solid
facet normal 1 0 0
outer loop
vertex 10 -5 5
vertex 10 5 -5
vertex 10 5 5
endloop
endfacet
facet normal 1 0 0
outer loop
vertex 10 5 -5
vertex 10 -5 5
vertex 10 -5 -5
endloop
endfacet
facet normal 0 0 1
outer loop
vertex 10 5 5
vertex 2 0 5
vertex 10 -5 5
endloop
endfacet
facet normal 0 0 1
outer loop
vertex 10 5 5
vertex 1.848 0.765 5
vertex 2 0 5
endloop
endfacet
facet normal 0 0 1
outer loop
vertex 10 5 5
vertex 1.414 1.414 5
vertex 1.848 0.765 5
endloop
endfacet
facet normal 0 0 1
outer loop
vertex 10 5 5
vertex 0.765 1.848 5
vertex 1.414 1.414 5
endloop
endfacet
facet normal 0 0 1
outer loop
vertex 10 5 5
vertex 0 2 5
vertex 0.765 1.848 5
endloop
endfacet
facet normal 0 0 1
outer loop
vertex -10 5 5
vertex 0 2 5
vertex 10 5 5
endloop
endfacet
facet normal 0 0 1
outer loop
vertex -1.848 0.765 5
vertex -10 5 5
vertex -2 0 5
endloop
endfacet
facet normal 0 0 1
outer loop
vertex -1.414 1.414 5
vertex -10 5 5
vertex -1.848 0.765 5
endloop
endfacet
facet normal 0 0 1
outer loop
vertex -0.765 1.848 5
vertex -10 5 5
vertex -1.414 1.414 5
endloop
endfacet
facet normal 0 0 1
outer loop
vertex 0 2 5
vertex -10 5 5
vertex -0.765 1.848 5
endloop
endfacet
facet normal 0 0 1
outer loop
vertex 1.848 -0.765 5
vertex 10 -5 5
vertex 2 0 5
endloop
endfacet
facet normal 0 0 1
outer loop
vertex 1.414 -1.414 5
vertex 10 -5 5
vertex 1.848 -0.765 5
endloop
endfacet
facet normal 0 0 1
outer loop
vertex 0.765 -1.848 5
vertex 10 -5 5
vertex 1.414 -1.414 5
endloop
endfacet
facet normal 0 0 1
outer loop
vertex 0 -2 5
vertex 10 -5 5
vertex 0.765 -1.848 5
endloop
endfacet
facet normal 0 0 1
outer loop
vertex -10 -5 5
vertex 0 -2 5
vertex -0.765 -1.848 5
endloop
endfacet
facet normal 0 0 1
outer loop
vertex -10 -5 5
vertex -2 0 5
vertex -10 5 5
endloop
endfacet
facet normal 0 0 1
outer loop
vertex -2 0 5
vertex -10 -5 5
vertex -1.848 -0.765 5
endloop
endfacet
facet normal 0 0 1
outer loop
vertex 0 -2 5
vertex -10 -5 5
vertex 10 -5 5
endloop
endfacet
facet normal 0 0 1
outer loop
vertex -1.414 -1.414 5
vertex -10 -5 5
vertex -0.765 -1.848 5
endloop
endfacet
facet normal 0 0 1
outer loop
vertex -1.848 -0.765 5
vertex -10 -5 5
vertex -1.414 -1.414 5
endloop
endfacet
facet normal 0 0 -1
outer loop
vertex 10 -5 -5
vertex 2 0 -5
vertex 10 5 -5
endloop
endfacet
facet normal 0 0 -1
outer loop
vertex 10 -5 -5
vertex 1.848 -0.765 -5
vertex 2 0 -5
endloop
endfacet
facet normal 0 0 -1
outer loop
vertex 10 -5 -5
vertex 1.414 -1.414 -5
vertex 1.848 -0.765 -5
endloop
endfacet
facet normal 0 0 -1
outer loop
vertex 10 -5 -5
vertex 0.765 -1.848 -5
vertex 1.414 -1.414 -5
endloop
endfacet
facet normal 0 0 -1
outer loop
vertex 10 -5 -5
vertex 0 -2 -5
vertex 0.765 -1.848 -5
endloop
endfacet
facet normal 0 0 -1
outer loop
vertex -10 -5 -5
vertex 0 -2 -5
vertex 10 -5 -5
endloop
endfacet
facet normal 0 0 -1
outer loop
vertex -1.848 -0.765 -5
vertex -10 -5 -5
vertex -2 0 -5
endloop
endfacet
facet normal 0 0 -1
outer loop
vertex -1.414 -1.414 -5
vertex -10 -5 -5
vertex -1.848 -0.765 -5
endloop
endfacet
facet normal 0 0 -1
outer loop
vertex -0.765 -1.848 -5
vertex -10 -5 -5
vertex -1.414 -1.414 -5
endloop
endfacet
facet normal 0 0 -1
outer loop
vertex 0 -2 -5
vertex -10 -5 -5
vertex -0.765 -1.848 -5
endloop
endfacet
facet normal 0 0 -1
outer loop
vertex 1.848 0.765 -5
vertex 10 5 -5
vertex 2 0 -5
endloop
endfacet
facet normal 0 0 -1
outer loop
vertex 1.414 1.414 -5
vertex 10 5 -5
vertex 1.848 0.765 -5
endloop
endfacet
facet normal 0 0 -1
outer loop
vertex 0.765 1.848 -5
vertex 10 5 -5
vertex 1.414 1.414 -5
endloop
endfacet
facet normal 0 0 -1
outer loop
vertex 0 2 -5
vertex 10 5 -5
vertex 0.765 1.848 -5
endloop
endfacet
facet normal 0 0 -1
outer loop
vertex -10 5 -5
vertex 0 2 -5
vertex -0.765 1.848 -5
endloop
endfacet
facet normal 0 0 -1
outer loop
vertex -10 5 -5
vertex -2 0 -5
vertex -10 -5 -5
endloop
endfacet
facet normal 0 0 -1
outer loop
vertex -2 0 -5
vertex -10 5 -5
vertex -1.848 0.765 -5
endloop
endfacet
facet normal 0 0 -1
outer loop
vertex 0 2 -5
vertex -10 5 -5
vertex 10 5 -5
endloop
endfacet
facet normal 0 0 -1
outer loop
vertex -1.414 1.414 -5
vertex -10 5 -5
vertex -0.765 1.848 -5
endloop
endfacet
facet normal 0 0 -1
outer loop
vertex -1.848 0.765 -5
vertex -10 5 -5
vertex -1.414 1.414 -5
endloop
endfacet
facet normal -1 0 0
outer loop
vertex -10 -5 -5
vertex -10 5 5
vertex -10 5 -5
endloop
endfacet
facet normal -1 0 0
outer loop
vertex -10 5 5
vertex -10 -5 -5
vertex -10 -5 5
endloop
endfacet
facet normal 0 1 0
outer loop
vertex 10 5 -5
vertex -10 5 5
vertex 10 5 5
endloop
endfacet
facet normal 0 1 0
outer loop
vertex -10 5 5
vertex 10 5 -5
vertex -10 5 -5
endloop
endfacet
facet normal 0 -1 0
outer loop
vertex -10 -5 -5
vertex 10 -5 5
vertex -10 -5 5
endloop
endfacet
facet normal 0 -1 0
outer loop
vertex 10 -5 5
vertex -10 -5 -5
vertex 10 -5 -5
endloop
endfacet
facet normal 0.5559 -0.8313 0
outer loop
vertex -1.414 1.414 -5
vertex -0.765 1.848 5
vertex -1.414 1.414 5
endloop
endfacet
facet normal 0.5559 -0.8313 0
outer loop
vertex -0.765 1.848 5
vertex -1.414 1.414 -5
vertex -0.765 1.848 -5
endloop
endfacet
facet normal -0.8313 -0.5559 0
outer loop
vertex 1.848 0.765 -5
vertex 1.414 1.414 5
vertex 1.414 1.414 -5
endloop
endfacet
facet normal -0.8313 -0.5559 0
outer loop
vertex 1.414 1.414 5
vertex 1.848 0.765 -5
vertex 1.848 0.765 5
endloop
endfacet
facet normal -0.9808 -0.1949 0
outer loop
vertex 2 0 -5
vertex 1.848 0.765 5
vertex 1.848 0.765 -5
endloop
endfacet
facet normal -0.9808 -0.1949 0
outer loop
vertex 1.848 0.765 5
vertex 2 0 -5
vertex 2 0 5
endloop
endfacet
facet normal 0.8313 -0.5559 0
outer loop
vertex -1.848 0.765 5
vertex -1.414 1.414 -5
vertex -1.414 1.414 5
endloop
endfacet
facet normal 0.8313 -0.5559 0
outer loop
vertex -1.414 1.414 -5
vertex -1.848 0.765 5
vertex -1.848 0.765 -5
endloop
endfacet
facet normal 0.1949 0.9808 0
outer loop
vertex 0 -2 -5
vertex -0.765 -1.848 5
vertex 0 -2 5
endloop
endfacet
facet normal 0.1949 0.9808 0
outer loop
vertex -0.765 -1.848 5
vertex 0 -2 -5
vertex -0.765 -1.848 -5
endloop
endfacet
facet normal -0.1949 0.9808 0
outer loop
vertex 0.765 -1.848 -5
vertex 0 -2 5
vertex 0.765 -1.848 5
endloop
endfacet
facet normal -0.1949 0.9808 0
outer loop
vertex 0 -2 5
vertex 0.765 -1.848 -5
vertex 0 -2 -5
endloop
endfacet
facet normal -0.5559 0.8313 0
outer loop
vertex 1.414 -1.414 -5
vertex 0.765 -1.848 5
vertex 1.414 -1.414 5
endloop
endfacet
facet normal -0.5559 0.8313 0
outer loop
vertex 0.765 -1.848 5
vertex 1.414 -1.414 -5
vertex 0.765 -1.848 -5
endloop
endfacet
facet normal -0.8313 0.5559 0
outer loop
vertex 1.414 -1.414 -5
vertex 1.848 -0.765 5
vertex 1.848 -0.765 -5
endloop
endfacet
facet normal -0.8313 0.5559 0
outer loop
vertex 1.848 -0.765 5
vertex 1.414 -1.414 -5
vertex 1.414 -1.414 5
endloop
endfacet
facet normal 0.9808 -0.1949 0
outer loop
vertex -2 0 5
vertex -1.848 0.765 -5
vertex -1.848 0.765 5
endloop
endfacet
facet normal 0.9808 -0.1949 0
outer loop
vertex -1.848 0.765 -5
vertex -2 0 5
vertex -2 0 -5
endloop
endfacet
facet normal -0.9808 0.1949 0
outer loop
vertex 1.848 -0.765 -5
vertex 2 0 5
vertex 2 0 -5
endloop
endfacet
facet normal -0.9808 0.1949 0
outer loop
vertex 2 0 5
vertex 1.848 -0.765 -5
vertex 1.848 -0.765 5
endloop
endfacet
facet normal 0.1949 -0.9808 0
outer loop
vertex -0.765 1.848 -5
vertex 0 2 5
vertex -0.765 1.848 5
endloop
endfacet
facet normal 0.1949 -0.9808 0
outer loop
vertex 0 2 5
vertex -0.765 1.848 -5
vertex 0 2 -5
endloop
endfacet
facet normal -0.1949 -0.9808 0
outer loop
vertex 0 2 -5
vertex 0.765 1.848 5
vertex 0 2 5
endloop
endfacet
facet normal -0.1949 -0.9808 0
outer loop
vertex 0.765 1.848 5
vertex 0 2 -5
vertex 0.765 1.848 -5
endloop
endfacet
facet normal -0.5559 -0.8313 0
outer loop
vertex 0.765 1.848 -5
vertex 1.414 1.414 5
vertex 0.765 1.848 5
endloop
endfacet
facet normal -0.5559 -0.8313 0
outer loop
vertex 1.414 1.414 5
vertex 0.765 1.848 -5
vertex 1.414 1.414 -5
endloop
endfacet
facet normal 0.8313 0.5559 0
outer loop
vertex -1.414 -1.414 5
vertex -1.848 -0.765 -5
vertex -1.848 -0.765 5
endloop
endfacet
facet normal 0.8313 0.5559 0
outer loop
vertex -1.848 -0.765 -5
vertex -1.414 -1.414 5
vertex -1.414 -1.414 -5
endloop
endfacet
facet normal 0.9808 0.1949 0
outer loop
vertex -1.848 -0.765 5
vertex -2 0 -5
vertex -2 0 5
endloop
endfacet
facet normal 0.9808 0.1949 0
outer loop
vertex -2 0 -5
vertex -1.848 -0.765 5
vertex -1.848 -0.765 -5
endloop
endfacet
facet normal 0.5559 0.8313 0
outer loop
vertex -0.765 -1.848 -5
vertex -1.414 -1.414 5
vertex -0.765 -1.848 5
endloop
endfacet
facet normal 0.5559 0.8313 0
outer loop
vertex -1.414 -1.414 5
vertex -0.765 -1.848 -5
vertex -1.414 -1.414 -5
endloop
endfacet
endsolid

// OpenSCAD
// A block with a round hole through its top, for the CanvasNet tool tests.
// An original work of this project: it has no dependencies and uses no text or font.
width = 20;

module block(w) {
    difference() {
        cube([w, 10, 10], center = true);
        cylinder(h = 12, r = 2, center = true, $fn = 16);
    }
}

function half(x) = x / 2;

block(width);
